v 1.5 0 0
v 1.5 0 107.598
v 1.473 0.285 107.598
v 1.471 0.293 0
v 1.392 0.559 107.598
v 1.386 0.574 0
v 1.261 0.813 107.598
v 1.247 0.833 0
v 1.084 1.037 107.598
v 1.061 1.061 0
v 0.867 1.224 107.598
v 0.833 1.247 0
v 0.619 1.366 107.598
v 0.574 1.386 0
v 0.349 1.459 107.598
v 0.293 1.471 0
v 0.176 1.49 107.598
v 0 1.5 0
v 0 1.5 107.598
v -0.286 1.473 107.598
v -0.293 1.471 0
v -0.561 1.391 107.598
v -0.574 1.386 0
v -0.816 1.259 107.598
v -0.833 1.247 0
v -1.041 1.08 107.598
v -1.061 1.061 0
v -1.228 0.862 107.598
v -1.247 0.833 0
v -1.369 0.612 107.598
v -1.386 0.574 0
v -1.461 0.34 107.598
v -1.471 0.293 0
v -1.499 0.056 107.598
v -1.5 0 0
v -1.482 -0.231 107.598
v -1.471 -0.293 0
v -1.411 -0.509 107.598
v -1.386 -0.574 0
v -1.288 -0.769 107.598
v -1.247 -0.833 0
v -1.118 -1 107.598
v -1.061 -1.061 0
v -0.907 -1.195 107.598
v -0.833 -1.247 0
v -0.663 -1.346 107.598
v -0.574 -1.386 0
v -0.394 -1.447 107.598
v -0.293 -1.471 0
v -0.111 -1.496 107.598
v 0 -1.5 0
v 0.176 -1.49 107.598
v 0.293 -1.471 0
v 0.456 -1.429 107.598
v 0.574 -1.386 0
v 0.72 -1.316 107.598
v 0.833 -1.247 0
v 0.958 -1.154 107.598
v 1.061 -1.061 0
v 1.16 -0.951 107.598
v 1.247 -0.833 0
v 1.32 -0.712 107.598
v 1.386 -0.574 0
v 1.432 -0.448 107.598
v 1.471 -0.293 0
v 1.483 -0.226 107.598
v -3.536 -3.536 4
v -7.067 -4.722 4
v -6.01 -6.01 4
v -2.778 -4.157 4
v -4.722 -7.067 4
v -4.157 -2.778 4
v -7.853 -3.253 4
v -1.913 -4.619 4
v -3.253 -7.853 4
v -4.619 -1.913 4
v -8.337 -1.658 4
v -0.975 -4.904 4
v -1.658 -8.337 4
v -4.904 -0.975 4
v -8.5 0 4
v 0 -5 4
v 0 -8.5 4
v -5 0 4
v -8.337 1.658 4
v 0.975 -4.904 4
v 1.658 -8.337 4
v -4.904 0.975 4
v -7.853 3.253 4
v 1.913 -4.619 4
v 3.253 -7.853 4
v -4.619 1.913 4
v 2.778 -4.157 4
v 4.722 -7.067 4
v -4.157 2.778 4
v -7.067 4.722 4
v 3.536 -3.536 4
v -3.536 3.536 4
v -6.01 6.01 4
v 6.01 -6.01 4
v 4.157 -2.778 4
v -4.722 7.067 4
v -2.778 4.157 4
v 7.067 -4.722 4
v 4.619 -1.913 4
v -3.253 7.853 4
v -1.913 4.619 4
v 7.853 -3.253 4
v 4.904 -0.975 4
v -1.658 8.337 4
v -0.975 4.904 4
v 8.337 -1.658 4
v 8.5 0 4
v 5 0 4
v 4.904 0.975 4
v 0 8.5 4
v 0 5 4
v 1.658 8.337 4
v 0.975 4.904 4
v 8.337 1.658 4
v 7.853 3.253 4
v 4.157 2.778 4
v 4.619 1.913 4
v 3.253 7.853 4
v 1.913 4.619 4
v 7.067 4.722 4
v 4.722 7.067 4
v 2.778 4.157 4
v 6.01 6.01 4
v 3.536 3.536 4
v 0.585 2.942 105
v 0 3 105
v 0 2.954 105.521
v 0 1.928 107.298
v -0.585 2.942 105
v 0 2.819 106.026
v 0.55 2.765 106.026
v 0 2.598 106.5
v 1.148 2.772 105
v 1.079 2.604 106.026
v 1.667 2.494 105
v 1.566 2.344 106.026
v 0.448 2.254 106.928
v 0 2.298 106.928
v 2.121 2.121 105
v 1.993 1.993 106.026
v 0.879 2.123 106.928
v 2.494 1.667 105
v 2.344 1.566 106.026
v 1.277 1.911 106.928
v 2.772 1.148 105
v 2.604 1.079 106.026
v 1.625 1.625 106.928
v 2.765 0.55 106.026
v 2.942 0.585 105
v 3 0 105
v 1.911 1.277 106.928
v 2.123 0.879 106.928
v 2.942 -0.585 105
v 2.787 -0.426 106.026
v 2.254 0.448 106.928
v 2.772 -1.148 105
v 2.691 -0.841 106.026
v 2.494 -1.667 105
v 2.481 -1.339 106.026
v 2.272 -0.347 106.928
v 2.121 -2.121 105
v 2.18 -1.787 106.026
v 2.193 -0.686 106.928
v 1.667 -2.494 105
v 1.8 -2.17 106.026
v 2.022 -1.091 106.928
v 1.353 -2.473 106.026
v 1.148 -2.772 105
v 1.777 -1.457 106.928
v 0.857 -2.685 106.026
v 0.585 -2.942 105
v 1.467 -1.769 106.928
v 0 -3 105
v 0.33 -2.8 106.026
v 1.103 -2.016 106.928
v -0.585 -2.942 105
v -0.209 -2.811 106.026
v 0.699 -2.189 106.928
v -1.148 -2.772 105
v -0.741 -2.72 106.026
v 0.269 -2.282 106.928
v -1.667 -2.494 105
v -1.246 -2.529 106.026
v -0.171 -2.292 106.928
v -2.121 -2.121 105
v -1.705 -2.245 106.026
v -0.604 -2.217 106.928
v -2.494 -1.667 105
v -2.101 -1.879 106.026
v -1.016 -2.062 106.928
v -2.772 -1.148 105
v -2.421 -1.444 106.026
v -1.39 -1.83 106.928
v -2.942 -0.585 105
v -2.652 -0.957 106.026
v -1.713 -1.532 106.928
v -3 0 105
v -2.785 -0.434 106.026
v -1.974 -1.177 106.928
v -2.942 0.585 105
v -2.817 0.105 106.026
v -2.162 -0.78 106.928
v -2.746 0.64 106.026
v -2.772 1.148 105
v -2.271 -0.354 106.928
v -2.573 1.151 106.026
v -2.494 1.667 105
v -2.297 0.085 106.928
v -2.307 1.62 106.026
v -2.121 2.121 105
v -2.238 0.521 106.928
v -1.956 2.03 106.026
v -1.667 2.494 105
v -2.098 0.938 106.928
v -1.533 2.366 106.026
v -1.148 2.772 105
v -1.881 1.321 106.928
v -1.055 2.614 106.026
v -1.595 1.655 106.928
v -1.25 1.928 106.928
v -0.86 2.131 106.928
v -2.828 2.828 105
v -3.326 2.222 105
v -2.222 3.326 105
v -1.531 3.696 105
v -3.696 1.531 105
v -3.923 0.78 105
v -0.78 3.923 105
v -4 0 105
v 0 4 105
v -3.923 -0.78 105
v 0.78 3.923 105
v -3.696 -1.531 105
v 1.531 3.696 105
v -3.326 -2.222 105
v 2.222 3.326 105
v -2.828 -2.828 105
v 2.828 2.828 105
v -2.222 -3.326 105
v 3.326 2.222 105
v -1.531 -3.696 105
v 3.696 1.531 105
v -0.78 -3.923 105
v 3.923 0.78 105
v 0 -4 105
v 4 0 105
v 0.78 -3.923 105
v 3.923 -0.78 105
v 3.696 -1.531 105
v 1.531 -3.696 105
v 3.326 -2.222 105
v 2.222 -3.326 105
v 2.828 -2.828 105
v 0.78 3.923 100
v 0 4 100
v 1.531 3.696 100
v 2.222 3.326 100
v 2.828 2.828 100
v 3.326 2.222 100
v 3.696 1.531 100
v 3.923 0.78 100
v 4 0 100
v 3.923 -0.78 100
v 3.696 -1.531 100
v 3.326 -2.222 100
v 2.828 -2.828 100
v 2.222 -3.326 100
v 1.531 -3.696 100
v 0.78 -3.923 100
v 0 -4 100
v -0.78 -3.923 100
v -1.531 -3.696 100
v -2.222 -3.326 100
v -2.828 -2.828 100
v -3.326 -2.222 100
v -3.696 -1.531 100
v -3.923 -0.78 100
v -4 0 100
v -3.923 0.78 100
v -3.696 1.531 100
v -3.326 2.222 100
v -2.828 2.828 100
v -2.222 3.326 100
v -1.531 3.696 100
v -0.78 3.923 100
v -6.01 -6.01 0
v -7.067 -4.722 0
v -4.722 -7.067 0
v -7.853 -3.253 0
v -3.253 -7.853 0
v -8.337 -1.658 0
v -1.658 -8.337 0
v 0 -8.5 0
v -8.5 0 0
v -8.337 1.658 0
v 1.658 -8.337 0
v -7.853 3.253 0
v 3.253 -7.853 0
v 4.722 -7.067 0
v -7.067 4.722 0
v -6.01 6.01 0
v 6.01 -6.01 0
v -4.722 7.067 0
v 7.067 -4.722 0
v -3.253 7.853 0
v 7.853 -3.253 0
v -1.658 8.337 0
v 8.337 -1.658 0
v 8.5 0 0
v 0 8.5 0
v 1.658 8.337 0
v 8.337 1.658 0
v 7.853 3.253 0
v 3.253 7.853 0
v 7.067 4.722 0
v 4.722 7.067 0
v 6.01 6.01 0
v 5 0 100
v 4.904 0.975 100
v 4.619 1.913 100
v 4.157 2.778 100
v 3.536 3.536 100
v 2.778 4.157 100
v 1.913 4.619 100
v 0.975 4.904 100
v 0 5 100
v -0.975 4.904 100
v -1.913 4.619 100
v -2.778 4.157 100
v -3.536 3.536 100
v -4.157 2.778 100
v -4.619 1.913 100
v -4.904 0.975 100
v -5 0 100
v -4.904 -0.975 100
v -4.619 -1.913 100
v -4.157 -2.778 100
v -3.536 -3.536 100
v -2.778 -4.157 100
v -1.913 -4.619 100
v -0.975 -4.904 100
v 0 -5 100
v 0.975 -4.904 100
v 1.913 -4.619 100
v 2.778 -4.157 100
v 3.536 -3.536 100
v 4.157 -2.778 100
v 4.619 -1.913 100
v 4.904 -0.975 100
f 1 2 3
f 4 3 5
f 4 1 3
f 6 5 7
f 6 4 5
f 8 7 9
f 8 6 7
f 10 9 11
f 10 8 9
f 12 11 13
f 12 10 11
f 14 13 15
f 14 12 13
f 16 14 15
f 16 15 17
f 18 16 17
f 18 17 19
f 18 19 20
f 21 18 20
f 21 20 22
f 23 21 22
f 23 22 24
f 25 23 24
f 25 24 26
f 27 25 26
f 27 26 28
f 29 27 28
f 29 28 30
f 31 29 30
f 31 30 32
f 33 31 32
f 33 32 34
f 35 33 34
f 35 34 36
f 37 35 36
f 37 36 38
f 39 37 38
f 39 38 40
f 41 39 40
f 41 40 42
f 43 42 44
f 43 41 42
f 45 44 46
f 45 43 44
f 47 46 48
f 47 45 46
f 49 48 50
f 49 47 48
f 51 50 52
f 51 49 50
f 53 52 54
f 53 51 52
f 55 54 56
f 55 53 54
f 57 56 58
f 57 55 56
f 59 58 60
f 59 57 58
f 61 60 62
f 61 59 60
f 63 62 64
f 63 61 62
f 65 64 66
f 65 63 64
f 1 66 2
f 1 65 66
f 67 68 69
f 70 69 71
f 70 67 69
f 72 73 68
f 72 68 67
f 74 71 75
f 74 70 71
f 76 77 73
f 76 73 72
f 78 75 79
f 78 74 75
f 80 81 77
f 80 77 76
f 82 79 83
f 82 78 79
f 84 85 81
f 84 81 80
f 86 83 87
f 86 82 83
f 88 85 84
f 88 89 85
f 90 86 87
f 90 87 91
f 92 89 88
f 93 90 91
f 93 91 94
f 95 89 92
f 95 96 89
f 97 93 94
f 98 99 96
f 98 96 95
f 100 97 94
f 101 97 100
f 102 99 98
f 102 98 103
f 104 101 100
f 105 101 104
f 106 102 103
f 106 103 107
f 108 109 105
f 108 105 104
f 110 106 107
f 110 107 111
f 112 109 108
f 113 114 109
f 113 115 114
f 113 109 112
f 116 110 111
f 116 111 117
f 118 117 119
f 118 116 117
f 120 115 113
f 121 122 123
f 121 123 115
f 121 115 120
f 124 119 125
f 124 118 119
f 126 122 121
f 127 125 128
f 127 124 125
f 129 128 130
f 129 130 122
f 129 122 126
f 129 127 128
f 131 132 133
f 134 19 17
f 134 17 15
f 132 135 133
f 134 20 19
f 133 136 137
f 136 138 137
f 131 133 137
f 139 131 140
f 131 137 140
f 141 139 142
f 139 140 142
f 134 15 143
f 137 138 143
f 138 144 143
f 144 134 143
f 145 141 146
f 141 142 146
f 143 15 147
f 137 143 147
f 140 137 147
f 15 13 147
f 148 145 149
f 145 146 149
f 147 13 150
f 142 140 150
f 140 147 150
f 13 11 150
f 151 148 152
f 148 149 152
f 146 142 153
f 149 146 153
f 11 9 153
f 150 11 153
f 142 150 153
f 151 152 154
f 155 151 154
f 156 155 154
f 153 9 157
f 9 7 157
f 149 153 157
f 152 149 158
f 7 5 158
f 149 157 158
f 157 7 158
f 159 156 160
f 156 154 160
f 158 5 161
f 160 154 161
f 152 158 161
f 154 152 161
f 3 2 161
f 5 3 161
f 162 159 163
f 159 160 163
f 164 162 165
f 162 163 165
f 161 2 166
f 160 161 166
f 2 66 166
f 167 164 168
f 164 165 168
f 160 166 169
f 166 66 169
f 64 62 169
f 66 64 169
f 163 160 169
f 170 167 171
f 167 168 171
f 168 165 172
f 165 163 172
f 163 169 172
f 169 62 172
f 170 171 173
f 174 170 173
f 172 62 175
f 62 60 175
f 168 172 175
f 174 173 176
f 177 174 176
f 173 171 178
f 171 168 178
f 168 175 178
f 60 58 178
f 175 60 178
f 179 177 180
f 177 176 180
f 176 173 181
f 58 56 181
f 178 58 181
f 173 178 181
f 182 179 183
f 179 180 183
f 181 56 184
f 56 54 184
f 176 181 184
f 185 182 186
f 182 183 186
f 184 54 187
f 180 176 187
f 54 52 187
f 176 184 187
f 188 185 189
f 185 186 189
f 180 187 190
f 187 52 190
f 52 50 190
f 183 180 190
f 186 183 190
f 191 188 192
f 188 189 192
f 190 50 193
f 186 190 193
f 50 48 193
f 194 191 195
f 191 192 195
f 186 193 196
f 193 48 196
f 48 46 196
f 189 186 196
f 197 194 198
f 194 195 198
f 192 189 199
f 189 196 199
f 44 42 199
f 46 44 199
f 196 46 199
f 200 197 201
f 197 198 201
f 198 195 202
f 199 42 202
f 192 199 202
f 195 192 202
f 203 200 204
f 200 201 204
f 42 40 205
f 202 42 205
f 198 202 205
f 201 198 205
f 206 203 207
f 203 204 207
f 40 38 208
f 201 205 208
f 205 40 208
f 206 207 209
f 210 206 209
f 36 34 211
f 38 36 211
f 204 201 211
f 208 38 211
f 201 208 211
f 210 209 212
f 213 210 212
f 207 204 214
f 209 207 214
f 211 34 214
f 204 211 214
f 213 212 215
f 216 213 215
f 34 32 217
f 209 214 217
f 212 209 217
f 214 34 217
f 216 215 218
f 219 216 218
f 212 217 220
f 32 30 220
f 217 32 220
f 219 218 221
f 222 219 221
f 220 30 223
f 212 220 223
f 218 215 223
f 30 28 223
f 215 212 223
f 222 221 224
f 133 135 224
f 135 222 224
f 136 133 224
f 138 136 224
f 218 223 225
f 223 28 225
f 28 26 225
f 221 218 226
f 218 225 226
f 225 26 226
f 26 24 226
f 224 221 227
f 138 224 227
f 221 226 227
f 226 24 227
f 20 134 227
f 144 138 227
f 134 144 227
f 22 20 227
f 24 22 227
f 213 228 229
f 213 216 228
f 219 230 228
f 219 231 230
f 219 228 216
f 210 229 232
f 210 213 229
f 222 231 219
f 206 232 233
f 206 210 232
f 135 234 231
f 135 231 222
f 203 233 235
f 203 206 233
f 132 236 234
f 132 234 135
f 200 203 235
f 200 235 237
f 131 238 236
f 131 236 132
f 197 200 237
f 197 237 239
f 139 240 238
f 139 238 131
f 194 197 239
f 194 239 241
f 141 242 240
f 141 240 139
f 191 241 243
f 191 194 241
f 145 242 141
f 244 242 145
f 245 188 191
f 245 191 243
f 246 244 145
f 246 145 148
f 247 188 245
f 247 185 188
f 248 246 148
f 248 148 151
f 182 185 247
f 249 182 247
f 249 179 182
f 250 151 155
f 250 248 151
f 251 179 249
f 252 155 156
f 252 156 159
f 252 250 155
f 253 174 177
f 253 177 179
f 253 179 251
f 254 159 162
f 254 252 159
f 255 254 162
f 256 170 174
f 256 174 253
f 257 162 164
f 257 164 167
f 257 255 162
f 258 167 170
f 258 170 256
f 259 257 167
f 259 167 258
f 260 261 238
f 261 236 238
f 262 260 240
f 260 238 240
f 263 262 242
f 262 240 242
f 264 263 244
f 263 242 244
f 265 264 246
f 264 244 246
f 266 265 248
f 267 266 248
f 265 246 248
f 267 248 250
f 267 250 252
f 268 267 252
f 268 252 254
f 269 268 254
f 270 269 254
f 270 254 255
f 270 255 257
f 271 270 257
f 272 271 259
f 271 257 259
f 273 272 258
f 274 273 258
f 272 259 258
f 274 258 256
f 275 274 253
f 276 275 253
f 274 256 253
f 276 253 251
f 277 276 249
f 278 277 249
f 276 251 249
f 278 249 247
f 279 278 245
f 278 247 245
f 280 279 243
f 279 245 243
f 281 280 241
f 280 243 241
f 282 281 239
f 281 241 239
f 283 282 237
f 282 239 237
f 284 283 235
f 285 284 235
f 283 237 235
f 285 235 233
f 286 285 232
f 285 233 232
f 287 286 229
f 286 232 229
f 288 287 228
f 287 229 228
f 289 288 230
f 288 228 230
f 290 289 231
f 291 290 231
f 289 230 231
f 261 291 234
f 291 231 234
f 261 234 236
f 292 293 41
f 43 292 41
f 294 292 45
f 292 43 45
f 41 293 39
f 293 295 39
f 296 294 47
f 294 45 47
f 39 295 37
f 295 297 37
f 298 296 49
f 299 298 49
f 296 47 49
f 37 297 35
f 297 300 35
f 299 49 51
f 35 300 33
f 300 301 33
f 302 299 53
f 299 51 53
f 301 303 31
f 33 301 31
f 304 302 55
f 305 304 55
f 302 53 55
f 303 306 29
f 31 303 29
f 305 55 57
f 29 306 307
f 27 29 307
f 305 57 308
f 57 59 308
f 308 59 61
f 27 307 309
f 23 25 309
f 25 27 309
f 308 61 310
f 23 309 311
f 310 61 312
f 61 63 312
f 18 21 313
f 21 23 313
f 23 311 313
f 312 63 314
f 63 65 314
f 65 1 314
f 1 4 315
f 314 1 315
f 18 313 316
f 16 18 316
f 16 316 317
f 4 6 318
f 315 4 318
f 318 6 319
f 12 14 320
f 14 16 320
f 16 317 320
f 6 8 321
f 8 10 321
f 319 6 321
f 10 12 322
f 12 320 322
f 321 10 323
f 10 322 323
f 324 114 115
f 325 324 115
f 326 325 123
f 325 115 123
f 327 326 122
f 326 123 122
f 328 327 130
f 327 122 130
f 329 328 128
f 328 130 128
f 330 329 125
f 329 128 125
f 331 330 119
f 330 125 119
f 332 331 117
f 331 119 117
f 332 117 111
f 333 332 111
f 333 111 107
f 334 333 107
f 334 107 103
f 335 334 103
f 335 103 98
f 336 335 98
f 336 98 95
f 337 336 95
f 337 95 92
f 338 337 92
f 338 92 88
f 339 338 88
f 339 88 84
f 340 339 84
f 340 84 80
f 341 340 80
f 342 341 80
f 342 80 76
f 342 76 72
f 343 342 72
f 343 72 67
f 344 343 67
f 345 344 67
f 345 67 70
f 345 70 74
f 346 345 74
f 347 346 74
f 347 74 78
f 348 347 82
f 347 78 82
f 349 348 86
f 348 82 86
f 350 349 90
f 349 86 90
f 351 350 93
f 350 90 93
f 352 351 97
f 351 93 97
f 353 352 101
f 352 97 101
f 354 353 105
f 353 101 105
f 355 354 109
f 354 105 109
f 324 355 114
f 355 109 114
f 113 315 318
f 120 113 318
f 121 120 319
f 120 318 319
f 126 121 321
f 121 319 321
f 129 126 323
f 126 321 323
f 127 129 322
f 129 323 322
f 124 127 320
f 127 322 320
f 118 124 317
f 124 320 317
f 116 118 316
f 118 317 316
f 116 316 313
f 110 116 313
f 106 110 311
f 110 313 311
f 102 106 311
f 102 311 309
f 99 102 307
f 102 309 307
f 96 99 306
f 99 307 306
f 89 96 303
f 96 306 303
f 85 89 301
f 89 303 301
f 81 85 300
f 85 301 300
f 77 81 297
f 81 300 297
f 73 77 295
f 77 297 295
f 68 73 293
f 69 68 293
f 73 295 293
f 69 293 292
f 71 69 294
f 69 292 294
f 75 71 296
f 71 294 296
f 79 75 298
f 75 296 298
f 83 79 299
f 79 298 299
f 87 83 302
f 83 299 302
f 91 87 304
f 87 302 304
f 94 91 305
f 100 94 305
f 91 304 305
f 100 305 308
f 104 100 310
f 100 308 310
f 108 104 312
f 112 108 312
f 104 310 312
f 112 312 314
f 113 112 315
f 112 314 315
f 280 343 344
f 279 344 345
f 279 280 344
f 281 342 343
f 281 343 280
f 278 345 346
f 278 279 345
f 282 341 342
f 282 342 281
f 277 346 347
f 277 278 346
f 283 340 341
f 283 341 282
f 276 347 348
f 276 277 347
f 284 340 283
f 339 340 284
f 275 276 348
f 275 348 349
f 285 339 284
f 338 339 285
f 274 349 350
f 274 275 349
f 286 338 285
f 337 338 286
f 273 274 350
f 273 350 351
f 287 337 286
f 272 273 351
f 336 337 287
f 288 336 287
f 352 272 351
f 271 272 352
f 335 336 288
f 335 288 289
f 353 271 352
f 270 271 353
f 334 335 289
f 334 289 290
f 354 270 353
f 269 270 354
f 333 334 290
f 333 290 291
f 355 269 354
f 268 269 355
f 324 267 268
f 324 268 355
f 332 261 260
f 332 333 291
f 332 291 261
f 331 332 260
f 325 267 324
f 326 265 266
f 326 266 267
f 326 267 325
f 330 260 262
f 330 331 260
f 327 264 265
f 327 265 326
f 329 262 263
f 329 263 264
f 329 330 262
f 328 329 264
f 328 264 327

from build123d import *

# Parameters (mm, degrees)
F0_R     = 8.5
F1_DEPTH = 4
F2_R     = 5
F3_DEPTH = 100
F4_W     = 4
F4_H     = 5
F8_R     = 1.5
F9_DEPTH = 109.1


with BuildPart() as f1:
    # F0 (on Top) → F1 (new body)
    with BuildSketch(Plane.XY):
        Circle(F0_R)
    extrude(amount=F1_DEPTH)

    # F2 (on Top) → F3 (join)
    with BuildSketch(Plane.XY):
        Circle(F2_R)
    extrude(amount=F3_DEPTH)

    # F4 (on Right) → F5 (revolve)
    with BuildSketch(Plane.YZ):
        with Locations((2, 102.5)):
            Rectangle(F4_W, F4_H)
    revolve(axis=Axis((0, 0, 102.5), (0, 0, -1)))

    # F6 (on Right) → F7 (revolve)
    with BuildSketch(Plane.YZ):
        with BuildLine():
            ThreePointArc((3, 105), (2.12132, 107.12132), (0, 108))
            Line((0, 108), (0, 105))
            Line((0, 105), (3, 105))
        make_face()
    revolve(axis=Axis((0, 0, 106.5), (0, 0, -1)))

    # F8 (on Top) → F9 (cut)
    with BuildSketch(Plane.XY):
        Circle(F8_R)
    extrude(amount=F9_DEPTH, mode=Mode.SUBTRACT)


solid = f1.part
